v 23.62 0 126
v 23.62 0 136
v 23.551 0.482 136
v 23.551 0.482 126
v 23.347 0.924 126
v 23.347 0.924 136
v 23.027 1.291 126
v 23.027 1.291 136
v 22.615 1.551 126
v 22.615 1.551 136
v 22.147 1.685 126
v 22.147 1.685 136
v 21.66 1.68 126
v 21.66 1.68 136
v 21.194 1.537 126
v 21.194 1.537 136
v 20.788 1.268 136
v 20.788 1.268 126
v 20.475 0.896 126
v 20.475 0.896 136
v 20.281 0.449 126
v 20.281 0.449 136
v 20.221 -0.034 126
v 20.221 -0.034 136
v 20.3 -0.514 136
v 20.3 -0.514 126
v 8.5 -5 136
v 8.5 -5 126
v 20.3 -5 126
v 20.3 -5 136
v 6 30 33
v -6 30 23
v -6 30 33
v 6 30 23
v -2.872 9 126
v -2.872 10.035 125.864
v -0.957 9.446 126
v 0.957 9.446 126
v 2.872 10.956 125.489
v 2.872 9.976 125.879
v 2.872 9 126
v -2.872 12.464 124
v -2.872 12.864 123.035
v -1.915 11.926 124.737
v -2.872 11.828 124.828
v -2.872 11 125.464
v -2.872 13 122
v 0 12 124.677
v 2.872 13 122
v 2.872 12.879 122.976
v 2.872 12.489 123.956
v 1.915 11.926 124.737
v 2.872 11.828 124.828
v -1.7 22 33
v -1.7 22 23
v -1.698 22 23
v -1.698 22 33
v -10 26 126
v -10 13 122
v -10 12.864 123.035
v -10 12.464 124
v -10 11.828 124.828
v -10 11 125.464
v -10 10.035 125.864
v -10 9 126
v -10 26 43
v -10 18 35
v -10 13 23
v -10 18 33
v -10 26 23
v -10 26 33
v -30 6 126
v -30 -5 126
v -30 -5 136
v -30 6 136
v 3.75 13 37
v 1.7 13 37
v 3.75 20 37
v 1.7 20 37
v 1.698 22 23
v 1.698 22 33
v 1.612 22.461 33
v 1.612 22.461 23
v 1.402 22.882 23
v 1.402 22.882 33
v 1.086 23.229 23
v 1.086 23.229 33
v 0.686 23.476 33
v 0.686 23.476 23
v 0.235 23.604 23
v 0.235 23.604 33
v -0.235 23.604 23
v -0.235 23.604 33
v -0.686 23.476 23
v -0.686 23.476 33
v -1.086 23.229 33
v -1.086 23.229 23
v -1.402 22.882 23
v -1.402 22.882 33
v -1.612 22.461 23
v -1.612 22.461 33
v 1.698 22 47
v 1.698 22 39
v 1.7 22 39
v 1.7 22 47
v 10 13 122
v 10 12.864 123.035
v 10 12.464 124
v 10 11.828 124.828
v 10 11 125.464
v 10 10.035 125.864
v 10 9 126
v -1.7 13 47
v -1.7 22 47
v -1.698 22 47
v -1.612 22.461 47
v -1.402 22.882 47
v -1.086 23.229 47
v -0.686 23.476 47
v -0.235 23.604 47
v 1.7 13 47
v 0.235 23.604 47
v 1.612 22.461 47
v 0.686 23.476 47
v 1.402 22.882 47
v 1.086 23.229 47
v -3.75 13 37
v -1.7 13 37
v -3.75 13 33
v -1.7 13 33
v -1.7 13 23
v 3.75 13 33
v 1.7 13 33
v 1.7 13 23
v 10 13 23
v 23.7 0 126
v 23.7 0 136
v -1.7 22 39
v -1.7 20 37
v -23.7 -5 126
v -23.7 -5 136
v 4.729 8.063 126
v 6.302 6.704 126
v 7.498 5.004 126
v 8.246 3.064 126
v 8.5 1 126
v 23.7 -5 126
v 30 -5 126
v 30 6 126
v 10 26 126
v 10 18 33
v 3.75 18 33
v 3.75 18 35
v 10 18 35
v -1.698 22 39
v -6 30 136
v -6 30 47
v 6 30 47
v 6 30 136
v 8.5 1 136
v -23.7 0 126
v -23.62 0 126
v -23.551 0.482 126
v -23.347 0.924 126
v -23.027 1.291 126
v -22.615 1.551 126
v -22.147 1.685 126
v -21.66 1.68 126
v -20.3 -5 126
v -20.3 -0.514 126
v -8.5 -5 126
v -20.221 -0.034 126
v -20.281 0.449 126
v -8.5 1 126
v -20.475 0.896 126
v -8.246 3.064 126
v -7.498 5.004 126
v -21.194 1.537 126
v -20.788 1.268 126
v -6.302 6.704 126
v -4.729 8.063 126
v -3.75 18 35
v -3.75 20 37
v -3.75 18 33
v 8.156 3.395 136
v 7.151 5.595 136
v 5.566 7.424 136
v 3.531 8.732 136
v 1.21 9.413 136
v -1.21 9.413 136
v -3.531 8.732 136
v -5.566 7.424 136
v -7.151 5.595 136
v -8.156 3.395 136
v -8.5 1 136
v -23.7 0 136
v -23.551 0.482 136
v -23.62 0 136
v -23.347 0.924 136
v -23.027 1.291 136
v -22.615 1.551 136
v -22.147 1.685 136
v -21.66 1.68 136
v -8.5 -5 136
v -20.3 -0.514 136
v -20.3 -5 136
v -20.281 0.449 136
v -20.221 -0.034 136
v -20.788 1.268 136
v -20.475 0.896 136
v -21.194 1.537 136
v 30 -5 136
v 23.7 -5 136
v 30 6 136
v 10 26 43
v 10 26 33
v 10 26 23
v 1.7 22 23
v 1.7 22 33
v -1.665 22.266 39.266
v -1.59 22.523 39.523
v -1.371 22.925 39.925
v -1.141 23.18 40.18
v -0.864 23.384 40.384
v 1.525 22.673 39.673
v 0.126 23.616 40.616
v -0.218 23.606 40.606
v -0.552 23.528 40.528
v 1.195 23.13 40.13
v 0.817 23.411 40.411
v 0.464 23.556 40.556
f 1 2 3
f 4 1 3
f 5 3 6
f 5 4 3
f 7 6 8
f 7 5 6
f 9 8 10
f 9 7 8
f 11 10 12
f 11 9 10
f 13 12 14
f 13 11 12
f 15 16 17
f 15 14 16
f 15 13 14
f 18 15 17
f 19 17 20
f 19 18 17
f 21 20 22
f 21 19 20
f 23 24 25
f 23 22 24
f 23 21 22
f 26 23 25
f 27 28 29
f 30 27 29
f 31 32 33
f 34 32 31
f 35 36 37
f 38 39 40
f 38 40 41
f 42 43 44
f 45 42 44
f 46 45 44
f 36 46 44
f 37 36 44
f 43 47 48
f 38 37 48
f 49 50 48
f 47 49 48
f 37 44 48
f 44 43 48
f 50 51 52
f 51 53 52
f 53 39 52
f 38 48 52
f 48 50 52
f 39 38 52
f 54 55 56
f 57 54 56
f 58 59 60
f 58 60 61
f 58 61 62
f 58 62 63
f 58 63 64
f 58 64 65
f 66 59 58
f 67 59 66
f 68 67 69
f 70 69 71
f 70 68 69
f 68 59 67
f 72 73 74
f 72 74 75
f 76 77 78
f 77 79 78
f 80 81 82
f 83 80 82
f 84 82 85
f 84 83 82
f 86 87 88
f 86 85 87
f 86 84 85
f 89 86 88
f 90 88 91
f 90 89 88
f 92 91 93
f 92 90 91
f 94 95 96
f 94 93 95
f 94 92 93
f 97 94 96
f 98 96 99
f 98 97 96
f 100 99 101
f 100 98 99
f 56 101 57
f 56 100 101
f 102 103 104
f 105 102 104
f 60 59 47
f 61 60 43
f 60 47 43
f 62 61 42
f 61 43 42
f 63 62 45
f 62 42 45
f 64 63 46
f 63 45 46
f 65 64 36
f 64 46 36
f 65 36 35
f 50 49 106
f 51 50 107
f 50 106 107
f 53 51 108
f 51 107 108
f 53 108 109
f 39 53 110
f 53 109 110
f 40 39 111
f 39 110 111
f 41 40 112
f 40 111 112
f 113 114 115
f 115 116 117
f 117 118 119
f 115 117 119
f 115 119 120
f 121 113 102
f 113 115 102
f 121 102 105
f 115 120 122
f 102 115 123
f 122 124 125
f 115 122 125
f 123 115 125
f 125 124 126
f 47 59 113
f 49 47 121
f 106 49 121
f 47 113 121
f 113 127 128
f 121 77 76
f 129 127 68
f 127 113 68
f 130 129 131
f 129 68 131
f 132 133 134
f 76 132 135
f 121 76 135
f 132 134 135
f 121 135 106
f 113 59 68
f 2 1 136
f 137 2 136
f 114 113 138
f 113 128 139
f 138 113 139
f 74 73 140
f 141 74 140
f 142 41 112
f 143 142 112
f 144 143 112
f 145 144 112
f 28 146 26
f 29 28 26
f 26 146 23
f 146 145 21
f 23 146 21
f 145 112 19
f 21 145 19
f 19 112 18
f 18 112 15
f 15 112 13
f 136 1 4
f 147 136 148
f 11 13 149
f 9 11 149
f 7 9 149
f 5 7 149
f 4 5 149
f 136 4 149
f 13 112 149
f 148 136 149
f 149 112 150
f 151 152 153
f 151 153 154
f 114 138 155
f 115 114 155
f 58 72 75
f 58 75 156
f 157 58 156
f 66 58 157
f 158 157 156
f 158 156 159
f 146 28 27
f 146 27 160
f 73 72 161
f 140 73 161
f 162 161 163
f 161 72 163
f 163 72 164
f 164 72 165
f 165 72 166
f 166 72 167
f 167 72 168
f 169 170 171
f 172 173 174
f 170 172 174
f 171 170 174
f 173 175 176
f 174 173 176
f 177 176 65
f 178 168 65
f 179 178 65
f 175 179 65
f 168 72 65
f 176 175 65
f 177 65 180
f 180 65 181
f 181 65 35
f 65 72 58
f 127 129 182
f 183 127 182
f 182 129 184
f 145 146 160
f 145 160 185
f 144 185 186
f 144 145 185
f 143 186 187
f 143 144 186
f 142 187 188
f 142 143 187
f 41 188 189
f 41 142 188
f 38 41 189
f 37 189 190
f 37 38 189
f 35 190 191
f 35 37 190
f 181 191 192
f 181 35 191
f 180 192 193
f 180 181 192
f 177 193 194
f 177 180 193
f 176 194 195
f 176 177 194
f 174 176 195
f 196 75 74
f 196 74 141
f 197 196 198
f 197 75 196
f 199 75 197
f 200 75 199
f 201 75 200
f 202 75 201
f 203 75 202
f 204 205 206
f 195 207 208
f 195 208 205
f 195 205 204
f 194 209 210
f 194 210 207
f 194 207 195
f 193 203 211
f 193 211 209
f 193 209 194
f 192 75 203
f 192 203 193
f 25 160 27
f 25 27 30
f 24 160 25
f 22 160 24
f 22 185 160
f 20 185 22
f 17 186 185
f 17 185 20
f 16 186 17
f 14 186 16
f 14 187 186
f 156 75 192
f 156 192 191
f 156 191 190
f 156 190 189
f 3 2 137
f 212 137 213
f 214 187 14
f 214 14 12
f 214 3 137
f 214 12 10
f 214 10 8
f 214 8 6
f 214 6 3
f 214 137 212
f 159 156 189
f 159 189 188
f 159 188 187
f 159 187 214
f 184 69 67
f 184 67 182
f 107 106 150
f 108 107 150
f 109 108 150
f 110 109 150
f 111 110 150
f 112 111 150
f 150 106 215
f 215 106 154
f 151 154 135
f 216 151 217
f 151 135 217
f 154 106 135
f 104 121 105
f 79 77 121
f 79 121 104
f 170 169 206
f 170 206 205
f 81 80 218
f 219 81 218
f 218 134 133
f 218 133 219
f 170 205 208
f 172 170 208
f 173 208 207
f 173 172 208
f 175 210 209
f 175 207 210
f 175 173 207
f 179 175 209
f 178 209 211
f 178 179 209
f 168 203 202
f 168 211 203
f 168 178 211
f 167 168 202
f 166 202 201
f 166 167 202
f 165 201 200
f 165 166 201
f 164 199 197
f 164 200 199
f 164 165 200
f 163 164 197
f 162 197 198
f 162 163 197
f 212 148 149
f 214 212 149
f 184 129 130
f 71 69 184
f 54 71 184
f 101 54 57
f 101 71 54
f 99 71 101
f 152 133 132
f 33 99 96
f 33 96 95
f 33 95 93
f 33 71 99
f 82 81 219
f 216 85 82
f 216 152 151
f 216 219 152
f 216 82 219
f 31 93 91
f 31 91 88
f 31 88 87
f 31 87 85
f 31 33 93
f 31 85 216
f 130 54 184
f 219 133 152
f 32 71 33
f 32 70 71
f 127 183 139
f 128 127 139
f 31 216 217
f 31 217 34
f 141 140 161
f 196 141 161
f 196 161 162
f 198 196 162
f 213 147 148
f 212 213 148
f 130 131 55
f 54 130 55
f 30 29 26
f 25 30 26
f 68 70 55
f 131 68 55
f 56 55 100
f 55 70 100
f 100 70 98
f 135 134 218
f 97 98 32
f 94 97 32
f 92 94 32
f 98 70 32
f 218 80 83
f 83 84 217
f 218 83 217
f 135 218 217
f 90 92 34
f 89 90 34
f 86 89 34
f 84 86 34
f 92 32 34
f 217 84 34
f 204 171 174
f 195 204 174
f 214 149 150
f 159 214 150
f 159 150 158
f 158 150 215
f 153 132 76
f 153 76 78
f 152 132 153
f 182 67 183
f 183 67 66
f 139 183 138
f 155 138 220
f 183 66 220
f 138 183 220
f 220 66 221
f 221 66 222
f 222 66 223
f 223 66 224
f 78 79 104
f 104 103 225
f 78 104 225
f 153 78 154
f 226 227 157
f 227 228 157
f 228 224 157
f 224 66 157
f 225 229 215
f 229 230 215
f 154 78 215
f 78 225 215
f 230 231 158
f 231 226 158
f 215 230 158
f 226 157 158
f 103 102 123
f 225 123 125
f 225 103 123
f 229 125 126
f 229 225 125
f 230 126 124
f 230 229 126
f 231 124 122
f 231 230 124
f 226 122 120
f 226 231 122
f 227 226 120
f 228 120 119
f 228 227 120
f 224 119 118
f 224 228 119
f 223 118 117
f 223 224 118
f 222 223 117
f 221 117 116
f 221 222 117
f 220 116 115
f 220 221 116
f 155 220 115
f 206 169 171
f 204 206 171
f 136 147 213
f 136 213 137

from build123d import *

# Parameters (mm, degrees)
BOX043_W                    = 7.5
BOX043_H                    = 27
BOX043_DEPTH                = 4
CYLINDER043_R               = 8.5
CYLINDER043_DEPTH           = 36
BOX042_W                    = 17
BOX042_H                    = 17
BOX042_DEPTH                = 18
BOX039_W                    = 3.4
BOX039_H                    = 24
BOX039_DEPTH                = 100
CYLINDER042_R               = 1.7
CYLINDER042_DEPTH           = 100
CYLINDER042_PLACEMENT_ANGLE = 45
BOX038_W                    = 3.4
BOX038_H                    = 24
BOX038_DEPTH                = 100
CYLINDER041_R               = 1.7
CYLINDER041_DEPTH           = 100
CYLINDER041_PLACEMENT_ANGLE = 45
BOX037_W                    = 3.4
BOX037_H                    = 24
BOX037_DEPTH                = 56
CYLINDER040_R               = 1.7
CYLINDER040_DEPTH           = 56
CYLINDER040_PLACEMENT_ANGLE = 45
BOX041_W                    = 25
BOX041_H                    = 32
BOX041_DEPTH                = 16
BOX041_PLACEMENT_ANGLE      = 45
BOX040_W                    = 22
BOX040_H                    = 17
BOX040_DEPTH                = 16
BOX035_W                    = 41
BOX035_H                    = 17
BOX035_DEPTH                = 122
BOX035_PLACEMENT_ANGLE      = 45
BOX036_W                    = 20
BOX036_H                    = 42
BOX036_DEPTH                = 124
BOX036_PLACEMENT_ANGLE      = 45
BOX034_W                    = 60
BOX034_H                    = 35
BOX034_DEPTH                = 10
BOX033_W                    = 20
BOX033_H                    = 17
BOX033_DEPTH                = 103
FILLET016_R                 = 4


with BuildPart() as cube039:
    # Box043 → Box043 (new body)
    with BuildSketch(Plane(origin=(-3.75, 11, 33), x_dir=(1, 0, 0), z_dir=(0, 0, 1))):
        with Locations((3.75, 13.5)):
            Rectangle(BOX043_W, BOX043_H)
    extrude(amount=BOX043_DEPTH)


with BuildPart() as cylinder015:
    # Cylinder043 → Cylinder043 (new body)
    with BuildSketch(Plane(origin=(0, 10, 121), x_dir=(1, 0, 0), z_dir=(0, 0, 1))):
        Circle(CYLINDER043_R)
    extrude(amount=CYLINDER043_DEPTH)


with BuildPart() as fusion031:
    # Box042 → Box042 (new body)
    with BuildSketch(Plane(origin=(-8.5, -7, 125), x_dir=(1, 0, 0), z_dir=(0, 0, 1))):
        with Locations((8.5, 8.5)):
            Rectangle(BOX042_W, BOX042_H)
    extrude(amount=BOX042_DEPTH)

    # Fusion031: union Cylinder015
    add(cylinder015.part)


with BuildPart() as fusion031_1:
    # Fusion031 placement: moved
    add(fusion031.part.moved(Location((0, -9, 0))))


with BuildPart() as cube035:
    # Box039 → Box039 (new body)
    with BuildSketch(Plane(origin=(20.3, -24, 50), x_dir=(1, 0, 0), z_dir=(0, 0, 1))):
        with Locations((1.7, 12)):
            Rectangle(BOX039_W, BOX039_H)
    extrude(amount=BOX039_DEPTH)


with BuildPart() as fusion029:
    # Cylinder042 → Cylinder042 (new body)
    with BuildSketch(Plane.XY):
        Circle(CYLINDER042_R)
    extrude(amount=CYLINDER042_DEPTH)


with BuildPart() as fusion029_1:
    # Cylinder042 placement: moved
    add(fusion029.part.moved(Location((21.9203, 0, 50))).rotate(Axis((21.9203, 0, 50), (0, 0, 1)), CYLINDER042_PLACEMENT_ANGLE))

    # Fusion029: union Cube035
    add(cube035.part)


with BuildPart() as cube034:
    # Box038 → Box038 (new body)
    with BuildSketch(Plane(origin=(-23.7, -24, 50), x_dir=(1, 0, 0), z_dir=(0, 0, 1))):
        with Locations((1.7, 12)):
            Rectangle(BOX038_W, BOX038_H)
    extrude(amount=BOX038_DEPTH)


with BuildPart() as fusion030:
    # Cylinder041 → Cylinder041 (new body)
    with BuildSketch(Plane.XY):
        Circle(CYLINDER041_R)
    extrude(amount=CYLINDER041_DEPTH)


with BuildPart() as fusion030_1:
    # Cylinder041 placement: moved
    add(fusion030.part.moved(Location((-21.9203, 0, 50))).rotate(Axis((-21.9203, 0, 50), (0, 0, 1)), CYLINDER041_PLACEMENT_ANGLE))

    # Fusion030: union Cube034
    add(cube034.part)


with BuildPart() as cube033:
    # Box037 → Box037 (new body)
    with BuildSketch(Plane(origin=(-1.7, -2, -3), x_dir=(1, 0, 0), z_dir=(0, 0, 1))):
        with Locations((1.7, 12)):
            Rectangle(BOX037_W, BOX037_H)
    extrude(amount=BOX037_DEPTH)


with BuildPart() as top_slot:
    # Cylinder040 → Cylinder040 (new body)
    with BuildSketch(Plane.XY):
        Circle(CYLINDER040_R)
    extrude(amount=CYLINDER040_DEPTH)


with BuildPart() as top_slot_1:
    # Cylinder040 placement: moved
    add(top_slot.part.moved(Location((0, 21.92031, -3))).rotate(Axis((0, 21.92031, -3), (0, 0, 1)), CYLINDER040_PLACEMENT_ANGLE))

    # Fusion028: union Cube033
    add(cube033.part)


with BuildPart() as top_slot_2:
    # Fusion028 placement: moved
    add(top_slot_1.part.moved(Location((0, 0, -6))))


with BuildPart() as cube037:
    # Box041 → Box041 (new body)
    with BuildSketch(Plane.XY):
        with Locations((12.5, 16)):
            Rectangle(BOX041_W, BOX041_H)
    extrude(amount=BOX041_DEPTH)


with BuildPart() as cube037_1:
    # Box041 placement: moved
    add(cube037.part.moved(Location((-13, 18, 35))).rotate(Axis((-13, 18, 35), (1, 0, 0)), BOX041_PLACEMENT_ANGLE))


with BuildPart() as cut052:
    # Box040 → Box040 (new body)
    with BuildSketch(Plane(origin=(-11, 18, 33), x_dir=(1, 0, 0), z_dir=(0, 0, 1))):
        with Locations((11, 8.5)):
            Rectangle(BOX040_W, BOX040_H)
    extrude(amount=BOX040_DEPTH)

    # Cut052: cut Cube037
    add(cube037_1.part, mode=Mode.SUBTRACT)


with BuildPart() as cube031:
    # Box035 → Box035 (new body)
    with BuildSketch(Plane.XY):
        with Locations((20.5, 8.5)):
            Rectangle(BOX035_W, BOX035_H)
    extrude(amount=BOX035_DEPTH)


with BuildPart() as cube031_1:
    # Box035 placement: moved
    add(cube031.part.moved(Location((-31, 5, 19))).rotate(Axis((-31, 5, 19), (0, 0, 1)), BOX035_PLACEMENT_ANGLE))


with BuildPart() as cube032:
    # Box036 → Box036 (new body)
    with BuildSketch(Plane.XY):
        with Locations((10, 21)):
            Rectangle(BOX036_W, BOX036_H)
    extrude(amount=BOX036_DEPTH)


with BuildPart() as cube032_1:
    # Box036 placement: moved
    add(cube032.part.moved(Location((33, 3, 19))).rotate(Axis((33, 3, 19), (0, 0, 1)), BOX036_PLACEMENT_ANGLE))


with BuildPart() as cube030:
    # Box034 → Box034 (new body)
    with BuildSketch(Plane(origin=(-30, -5, 126), x_dir=(1, 0, 0), z_dir=(0, 0, 1))):
        with Locations((30, 17.5)):
            Rectangle(BOX034_W, BOX034_H)
    extrude(amount=BOX034_DEPTH)


with BuildPart() as paste_extruder_top_strengthener:
    # Box033 → Box033 (new body)
    with BuildSketch(Plane(origin=(-10, 13, 23), x_dir=(1, 0, 0), z_dir=(0, 0, 1))):
        with Locations((10, 8.5)):
            Rectangle(BOX033_W, BOX033_H)
    extrude(amount=BOX033_DEPTH)

    # Fusion027: union Cube030
    add(cube030.part)

    # Cut050: cut Cube032
    add(cube032_1.part, mode=Mode.SUBTRACT)

    # Cut051: cut Cube031
    add(cube031_1.part, mode=Mode.SUBTRACT)

    # Cut053: cut Cut052
    add(cut052.part, mode=Mode.SUBTRACT)

    # Cut054: cut top-slot
    add(top_slot_2.part, mode=Mode.SUBTRACT)

    # Cut055: cut Fusion030
    add(fusion030_1.part, mode=Mode.SUBTRACT)

    # Cut056: cut Fusion029
    add(fusion029_1.part, mode=Mode.SUBTRACT)

    # Cut057: cut Fusion031
    add(fusion031_1.part, mode=Mode.SUBTRACT)

    # Cut058: cut Cube039
    add(cube039.part, mode=Mode.SUBTRACT)

    # Fillet016
    fillet016_edges = [paste_extruder_top_strengthener.edges().sort_by_distance(p)[0] for p in [
        (0, 13, 126),
    ]]
    fillet(fillet016_edges, radius=FILLET016_R)


solid = paste_extruder_top_strengthener.part
